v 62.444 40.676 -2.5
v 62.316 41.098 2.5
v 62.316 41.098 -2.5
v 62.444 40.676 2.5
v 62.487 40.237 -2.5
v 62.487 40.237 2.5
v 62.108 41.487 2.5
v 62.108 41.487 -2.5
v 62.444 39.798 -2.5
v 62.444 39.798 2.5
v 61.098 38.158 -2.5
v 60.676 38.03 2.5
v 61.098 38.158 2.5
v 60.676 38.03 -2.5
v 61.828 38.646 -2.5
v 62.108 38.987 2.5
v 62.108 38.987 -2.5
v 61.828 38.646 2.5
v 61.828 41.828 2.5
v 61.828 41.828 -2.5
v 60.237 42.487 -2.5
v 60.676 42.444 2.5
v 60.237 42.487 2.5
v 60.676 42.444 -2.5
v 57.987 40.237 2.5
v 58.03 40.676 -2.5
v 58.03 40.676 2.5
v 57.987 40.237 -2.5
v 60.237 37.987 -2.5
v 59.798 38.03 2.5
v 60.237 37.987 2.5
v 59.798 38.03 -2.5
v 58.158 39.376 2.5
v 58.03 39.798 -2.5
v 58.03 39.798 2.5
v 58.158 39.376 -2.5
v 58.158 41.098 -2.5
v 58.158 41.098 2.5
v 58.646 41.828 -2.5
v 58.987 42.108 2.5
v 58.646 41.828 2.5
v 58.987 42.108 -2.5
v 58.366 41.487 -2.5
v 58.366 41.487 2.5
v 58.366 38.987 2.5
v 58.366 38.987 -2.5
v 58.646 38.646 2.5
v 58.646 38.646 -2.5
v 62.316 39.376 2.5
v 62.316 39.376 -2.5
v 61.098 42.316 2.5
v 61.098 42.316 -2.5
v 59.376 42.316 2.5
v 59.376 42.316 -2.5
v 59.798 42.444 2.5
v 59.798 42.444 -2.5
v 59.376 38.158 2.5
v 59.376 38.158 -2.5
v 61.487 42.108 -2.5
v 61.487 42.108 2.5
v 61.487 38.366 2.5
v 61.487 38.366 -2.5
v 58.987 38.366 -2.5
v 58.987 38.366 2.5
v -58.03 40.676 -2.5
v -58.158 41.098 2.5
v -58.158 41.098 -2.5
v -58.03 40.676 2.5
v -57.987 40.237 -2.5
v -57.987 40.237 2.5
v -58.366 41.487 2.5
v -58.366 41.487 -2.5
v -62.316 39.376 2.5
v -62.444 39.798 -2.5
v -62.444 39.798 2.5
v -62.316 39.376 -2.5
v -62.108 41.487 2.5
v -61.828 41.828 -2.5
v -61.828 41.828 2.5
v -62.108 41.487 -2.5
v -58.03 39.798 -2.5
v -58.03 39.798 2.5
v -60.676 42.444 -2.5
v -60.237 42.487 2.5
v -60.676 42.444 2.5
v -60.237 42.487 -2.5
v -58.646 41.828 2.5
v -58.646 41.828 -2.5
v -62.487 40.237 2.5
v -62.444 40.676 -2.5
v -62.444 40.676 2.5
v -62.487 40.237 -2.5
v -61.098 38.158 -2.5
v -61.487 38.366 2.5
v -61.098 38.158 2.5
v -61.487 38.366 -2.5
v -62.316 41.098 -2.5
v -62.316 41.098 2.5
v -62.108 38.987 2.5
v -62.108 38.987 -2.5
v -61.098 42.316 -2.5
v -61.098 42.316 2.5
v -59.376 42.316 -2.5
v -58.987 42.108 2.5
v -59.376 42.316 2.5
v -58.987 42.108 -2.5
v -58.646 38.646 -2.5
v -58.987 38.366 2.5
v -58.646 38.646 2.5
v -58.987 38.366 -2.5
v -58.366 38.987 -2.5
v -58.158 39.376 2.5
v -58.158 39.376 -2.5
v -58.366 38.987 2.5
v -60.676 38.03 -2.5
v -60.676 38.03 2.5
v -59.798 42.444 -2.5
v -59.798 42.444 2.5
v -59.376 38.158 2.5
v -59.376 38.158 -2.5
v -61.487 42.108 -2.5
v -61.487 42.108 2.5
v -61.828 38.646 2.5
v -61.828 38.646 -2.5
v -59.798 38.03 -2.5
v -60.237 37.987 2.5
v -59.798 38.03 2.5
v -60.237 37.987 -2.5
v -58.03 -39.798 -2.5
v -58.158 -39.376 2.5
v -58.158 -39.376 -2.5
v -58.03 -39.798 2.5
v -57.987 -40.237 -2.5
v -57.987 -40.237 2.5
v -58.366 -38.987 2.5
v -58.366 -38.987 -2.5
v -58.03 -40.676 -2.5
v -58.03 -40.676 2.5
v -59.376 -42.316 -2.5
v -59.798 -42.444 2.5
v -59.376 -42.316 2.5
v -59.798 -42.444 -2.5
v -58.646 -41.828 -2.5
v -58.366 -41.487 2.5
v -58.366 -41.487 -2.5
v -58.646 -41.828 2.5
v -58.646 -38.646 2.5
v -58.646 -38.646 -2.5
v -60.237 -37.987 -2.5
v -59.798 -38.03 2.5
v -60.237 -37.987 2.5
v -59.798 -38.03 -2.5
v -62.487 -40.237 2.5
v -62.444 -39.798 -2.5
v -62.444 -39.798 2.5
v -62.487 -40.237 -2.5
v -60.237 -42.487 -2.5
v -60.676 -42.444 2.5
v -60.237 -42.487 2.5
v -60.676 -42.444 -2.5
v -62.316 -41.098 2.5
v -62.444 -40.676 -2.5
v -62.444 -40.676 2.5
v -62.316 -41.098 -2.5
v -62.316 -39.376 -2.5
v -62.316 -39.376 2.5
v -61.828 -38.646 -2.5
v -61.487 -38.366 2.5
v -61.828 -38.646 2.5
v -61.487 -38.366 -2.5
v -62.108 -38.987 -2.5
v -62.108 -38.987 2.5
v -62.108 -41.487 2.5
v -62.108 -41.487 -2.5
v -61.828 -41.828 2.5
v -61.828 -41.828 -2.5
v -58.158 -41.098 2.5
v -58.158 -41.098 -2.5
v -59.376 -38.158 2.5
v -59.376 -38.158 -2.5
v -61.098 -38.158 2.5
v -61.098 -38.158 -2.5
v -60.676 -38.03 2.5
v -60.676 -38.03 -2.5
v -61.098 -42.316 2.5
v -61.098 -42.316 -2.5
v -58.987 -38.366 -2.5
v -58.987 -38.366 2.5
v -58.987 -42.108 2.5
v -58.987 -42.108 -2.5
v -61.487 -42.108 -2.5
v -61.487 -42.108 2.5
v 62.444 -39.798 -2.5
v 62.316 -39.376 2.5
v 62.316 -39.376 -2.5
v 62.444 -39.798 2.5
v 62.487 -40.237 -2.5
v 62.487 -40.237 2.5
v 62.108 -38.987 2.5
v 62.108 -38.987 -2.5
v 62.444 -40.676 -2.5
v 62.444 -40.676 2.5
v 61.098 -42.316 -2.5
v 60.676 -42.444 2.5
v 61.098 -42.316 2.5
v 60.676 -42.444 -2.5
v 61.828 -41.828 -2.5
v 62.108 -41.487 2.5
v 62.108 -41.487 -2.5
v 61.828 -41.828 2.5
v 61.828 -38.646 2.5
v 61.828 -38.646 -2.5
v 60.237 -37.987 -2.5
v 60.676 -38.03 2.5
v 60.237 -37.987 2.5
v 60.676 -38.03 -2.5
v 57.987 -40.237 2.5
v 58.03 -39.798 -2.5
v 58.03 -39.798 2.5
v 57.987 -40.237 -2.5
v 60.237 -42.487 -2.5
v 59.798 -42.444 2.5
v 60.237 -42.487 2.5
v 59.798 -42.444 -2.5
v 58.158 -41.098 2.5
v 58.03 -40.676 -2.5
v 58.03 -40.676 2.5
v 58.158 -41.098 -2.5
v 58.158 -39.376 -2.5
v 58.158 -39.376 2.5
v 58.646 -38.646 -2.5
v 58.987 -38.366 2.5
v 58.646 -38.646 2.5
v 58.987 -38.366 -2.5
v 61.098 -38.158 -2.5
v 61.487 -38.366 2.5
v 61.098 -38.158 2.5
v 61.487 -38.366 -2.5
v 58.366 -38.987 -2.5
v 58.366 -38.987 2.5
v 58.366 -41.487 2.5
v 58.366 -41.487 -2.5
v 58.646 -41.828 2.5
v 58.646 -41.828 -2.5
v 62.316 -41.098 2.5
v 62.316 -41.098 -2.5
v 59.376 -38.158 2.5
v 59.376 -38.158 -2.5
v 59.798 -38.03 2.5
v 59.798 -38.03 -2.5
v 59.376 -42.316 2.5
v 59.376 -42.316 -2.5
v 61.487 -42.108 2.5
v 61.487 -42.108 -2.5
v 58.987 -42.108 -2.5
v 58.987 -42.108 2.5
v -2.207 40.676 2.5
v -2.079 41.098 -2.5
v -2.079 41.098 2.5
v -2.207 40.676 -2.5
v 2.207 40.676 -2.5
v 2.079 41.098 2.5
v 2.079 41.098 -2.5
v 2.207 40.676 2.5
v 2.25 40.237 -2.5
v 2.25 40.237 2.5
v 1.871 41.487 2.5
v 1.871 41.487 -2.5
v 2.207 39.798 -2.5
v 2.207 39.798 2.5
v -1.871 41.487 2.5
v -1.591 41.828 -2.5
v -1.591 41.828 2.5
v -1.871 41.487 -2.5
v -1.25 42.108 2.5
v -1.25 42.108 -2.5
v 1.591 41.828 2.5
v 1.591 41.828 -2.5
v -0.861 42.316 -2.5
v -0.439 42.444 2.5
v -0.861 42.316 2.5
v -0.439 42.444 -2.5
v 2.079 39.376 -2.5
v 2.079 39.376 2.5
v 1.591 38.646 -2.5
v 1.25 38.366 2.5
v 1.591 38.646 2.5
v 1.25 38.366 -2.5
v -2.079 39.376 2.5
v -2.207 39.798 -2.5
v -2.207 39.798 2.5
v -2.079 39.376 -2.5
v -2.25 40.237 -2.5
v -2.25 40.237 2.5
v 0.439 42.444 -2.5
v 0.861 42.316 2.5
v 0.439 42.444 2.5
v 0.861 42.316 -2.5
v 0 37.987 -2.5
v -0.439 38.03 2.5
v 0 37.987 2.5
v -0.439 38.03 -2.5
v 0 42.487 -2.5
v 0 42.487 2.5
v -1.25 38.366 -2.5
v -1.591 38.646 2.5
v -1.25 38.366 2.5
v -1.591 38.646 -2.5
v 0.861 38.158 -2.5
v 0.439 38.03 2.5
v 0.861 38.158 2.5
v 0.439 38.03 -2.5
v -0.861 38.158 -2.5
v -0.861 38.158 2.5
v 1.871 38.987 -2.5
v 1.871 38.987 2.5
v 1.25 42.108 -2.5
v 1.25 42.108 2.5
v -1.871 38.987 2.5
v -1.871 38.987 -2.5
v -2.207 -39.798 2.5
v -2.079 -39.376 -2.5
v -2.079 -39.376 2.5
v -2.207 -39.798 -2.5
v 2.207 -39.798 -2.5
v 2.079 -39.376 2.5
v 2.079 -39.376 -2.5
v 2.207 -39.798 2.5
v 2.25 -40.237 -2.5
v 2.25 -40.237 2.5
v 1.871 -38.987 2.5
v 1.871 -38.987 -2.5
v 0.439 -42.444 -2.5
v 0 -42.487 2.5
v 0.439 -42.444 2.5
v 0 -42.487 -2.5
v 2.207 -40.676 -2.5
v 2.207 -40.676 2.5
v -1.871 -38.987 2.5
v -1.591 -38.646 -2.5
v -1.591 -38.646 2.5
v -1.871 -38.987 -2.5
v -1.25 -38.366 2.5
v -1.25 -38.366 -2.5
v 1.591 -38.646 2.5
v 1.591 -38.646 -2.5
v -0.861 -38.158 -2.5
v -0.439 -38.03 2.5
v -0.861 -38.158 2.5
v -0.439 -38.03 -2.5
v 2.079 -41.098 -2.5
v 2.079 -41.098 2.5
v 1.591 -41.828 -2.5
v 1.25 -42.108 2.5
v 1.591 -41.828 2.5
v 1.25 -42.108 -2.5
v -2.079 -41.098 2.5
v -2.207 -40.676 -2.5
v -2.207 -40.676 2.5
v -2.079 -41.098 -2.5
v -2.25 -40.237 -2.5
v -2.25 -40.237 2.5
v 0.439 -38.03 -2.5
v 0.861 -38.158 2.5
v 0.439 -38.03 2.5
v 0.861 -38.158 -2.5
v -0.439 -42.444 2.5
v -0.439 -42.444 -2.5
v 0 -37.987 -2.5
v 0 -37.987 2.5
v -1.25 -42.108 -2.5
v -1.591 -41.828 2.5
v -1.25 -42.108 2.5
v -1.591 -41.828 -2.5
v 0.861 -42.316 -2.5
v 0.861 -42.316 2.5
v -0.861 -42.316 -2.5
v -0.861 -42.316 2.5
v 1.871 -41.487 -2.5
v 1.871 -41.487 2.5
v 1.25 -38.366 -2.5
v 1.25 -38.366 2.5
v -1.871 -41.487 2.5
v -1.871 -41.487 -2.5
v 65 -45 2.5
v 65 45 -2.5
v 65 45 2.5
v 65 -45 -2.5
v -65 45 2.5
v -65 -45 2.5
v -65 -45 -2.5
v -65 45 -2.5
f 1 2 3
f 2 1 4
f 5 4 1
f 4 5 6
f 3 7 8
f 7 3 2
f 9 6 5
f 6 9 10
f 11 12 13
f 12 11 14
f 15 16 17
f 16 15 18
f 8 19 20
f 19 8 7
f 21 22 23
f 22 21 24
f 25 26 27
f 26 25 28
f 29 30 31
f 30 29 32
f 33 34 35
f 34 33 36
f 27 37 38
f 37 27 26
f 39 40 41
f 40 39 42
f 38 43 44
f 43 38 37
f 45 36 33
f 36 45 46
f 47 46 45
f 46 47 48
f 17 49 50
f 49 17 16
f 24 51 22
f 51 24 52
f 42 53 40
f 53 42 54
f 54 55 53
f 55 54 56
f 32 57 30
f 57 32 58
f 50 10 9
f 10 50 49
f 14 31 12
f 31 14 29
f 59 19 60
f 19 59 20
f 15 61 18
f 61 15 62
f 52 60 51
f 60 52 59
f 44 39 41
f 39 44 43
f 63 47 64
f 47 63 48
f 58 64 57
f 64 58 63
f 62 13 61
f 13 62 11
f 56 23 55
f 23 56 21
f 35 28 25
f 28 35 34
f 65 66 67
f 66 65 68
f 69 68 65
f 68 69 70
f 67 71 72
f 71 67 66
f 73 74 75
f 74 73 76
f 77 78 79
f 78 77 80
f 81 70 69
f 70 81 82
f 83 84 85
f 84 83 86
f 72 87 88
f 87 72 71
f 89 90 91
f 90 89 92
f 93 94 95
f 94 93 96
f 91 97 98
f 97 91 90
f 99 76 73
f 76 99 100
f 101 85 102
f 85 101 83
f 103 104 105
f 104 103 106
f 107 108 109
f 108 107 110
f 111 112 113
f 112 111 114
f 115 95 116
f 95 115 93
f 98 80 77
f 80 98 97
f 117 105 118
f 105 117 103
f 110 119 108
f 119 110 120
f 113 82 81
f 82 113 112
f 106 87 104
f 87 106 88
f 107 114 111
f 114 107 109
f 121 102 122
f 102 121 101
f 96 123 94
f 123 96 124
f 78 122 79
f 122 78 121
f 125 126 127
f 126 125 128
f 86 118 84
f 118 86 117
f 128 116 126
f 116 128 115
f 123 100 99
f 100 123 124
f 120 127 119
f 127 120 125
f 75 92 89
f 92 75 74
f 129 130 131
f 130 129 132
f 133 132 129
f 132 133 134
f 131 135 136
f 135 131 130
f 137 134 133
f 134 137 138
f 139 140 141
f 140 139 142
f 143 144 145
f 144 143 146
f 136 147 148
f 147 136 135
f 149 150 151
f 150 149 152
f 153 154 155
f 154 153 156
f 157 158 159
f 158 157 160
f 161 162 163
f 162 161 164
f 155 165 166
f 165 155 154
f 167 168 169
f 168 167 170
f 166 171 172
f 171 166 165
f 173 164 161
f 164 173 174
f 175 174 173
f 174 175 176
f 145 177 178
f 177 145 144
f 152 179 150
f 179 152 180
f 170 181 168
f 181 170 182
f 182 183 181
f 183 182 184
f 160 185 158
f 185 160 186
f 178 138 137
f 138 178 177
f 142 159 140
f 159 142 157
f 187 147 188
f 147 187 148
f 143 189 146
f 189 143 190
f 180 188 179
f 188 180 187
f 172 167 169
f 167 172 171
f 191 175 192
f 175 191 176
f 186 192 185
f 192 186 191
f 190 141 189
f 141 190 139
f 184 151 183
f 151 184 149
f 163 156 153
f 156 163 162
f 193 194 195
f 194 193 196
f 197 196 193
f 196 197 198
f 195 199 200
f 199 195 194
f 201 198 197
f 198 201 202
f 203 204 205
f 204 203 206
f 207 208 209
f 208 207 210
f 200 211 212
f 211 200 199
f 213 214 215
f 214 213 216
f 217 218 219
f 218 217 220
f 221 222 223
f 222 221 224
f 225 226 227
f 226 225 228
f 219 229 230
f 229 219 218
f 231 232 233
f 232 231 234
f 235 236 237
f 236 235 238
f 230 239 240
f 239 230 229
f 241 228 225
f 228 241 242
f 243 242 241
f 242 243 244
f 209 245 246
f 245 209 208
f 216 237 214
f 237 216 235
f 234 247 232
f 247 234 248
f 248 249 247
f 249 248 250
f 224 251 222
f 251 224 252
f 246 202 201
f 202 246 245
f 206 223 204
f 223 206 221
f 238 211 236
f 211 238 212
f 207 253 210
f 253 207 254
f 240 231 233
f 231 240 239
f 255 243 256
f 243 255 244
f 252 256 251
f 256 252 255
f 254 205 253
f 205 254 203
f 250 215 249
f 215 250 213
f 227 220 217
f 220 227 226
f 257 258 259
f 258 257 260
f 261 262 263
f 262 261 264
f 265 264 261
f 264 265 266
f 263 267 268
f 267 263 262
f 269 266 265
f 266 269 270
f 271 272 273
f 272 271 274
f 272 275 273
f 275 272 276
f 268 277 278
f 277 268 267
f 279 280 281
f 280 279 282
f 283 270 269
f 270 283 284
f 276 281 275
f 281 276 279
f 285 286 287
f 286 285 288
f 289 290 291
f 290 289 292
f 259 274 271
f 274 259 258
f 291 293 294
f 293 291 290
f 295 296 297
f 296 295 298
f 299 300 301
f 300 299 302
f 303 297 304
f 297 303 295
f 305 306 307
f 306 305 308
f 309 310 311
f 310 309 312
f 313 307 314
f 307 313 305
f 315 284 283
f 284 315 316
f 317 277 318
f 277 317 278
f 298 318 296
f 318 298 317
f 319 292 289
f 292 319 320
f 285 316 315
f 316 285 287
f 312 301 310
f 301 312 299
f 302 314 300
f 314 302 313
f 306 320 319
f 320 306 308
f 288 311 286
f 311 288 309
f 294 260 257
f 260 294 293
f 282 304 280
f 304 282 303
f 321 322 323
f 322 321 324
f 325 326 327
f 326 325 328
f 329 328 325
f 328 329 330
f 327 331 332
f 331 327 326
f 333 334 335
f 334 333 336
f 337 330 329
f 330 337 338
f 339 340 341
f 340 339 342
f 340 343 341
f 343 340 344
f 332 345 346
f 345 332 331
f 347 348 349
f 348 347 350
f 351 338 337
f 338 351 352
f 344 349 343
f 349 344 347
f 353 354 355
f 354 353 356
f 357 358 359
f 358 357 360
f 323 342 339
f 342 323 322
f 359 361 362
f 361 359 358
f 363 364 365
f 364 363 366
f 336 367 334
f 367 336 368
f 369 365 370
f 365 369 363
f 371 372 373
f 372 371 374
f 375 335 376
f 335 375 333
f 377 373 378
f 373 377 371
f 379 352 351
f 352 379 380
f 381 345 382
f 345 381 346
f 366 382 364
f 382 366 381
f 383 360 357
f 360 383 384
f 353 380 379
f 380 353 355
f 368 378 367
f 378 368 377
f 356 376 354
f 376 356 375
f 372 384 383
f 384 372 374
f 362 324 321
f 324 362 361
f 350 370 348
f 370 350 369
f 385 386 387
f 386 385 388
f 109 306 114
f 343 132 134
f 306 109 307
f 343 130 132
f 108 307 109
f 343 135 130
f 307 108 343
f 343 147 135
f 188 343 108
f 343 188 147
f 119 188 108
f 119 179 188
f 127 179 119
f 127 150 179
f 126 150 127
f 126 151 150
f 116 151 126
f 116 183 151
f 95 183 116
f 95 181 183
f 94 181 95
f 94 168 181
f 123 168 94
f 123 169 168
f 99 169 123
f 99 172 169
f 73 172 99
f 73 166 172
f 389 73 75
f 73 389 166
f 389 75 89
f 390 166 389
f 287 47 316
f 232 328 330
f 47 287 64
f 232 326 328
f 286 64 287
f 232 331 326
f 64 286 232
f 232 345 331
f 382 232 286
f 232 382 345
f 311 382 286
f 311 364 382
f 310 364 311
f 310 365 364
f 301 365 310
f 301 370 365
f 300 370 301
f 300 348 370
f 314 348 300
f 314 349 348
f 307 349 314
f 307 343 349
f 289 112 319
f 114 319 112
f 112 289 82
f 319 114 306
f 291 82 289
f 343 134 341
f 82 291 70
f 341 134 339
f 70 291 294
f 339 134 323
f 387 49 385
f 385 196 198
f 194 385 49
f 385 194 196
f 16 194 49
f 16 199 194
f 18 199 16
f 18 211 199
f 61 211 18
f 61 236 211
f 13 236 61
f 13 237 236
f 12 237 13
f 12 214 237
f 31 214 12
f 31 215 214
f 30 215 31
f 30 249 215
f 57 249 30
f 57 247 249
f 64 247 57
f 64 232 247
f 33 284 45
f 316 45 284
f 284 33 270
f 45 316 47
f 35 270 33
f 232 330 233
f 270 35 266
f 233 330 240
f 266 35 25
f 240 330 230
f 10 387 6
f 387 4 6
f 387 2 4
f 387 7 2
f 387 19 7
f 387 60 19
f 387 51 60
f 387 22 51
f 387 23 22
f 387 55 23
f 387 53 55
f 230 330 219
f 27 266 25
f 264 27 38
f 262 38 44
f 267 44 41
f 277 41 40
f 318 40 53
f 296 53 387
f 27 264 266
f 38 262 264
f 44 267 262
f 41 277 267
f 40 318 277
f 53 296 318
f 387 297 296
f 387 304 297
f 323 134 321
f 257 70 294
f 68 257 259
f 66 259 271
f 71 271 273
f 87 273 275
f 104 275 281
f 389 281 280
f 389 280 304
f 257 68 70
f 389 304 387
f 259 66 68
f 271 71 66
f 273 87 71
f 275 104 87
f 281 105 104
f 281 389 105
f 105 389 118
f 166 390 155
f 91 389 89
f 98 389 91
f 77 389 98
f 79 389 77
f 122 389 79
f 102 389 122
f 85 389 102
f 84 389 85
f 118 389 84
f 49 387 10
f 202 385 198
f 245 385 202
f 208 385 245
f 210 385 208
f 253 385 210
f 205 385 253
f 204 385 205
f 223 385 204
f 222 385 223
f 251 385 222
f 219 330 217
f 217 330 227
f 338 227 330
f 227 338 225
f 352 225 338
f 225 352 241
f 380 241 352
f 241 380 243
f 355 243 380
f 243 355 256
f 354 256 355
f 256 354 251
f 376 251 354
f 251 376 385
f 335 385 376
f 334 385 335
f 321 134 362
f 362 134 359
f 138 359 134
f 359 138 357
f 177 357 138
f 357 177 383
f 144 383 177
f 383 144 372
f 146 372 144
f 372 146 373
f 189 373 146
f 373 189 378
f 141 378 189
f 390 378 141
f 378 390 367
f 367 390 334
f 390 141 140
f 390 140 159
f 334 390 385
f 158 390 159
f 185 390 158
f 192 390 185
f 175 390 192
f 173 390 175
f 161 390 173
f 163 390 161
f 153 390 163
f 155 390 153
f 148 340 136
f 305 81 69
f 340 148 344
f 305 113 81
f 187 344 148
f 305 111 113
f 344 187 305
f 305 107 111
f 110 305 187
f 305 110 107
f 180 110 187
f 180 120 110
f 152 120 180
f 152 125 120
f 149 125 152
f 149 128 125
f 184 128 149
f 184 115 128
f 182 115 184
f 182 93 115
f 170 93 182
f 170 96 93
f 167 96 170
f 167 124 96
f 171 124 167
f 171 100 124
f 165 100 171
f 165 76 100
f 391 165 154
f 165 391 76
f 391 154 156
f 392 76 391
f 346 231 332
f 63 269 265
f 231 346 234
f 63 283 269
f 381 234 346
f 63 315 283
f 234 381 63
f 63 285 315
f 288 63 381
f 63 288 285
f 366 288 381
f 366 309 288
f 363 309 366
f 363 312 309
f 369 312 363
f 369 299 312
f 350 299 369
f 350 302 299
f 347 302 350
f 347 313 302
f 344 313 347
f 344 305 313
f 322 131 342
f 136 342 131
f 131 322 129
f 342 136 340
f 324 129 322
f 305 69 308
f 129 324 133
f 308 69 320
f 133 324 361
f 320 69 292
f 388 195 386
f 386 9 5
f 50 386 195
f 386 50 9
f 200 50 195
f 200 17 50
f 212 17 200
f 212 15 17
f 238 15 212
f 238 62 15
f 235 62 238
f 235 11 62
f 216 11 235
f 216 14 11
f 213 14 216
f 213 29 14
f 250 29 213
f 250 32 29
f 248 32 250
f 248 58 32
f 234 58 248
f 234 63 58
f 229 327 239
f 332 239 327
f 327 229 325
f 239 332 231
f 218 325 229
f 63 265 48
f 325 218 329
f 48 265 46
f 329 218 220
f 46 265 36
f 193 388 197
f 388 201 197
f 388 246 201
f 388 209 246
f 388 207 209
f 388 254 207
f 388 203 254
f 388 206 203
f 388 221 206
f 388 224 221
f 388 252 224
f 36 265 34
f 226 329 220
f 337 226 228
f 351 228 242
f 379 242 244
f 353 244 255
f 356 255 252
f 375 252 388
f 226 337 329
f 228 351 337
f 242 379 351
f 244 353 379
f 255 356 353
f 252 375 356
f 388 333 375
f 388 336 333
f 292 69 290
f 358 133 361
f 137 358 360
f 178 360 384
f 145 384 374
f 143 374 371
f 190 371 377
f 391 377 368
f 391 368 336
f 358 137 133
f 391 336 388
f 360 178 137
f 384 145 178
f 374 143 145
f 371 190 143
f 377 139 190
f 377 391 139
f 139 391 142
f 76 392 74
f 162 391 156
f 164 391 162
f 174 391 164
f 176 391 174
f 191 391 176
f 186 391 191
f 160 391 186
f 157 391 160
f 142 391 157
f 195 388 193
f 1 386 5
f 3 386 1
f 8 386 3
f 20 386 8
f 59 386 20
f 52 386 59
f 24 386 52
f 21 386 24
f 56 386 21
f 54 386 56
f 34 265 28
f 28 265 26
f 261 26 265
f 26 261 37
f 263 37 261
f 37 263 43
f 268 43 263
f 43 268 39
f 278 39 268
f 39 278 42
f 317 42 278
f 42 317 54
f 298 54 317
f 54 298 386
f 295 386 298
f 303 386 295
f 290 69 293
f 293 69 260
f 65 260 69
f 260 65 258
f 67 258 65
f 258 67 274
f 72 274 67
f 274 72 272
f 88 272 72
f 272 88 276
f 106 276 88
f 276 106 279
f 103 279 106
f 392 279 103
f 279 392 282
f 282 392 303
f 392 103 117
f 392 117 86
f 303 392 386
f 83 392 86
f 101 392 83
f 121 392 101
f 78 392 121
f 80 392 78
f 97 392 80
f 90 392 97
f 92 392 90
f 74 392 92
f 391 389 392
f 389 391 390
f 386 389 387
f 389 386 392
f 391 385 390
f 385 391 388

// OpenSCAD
$fn = 32;

// ----------------------------------------------------------------------
// Corner plate 130 x 90 x 5
// 6 holes, centres taken from the edge offset
// ----------------------------------------------------------------------

// --- parameters (mm) ---
plate = [130, 90, 5];  // overall size (x, y, z)
holes = 6;             // number of holes the drawing asks for
hole_d = 4.5;          // hole diameter
edge = 4.763;          // hole centre offset from the plate edge

// --- derived feature positions (mm) ---
corner_x = plate[0] / 2 - edge;  // = 60.24   corner hole X
corner_y = plate[1] / 2 - edge;  // = 40.24   corner hole Y
feature_centers = [
  [corner_x, corner_y],
  [-corner_x, corner_y],
  [-corner_x, -corner_y],
  [corner_x, -corner_y],
  [0, corner_y],
  [0, -corner_y]
];   // hole centres the loop below drills

// plate outline, every hole drilled through with the same cutters
difference() {
  cube(plate, center = true);
  for (centre = feature_centers)
    translate([centre[0], centre[1], 0])
      cylinder(d = hole_d, h = plate[2] + 2, center = true);
}
